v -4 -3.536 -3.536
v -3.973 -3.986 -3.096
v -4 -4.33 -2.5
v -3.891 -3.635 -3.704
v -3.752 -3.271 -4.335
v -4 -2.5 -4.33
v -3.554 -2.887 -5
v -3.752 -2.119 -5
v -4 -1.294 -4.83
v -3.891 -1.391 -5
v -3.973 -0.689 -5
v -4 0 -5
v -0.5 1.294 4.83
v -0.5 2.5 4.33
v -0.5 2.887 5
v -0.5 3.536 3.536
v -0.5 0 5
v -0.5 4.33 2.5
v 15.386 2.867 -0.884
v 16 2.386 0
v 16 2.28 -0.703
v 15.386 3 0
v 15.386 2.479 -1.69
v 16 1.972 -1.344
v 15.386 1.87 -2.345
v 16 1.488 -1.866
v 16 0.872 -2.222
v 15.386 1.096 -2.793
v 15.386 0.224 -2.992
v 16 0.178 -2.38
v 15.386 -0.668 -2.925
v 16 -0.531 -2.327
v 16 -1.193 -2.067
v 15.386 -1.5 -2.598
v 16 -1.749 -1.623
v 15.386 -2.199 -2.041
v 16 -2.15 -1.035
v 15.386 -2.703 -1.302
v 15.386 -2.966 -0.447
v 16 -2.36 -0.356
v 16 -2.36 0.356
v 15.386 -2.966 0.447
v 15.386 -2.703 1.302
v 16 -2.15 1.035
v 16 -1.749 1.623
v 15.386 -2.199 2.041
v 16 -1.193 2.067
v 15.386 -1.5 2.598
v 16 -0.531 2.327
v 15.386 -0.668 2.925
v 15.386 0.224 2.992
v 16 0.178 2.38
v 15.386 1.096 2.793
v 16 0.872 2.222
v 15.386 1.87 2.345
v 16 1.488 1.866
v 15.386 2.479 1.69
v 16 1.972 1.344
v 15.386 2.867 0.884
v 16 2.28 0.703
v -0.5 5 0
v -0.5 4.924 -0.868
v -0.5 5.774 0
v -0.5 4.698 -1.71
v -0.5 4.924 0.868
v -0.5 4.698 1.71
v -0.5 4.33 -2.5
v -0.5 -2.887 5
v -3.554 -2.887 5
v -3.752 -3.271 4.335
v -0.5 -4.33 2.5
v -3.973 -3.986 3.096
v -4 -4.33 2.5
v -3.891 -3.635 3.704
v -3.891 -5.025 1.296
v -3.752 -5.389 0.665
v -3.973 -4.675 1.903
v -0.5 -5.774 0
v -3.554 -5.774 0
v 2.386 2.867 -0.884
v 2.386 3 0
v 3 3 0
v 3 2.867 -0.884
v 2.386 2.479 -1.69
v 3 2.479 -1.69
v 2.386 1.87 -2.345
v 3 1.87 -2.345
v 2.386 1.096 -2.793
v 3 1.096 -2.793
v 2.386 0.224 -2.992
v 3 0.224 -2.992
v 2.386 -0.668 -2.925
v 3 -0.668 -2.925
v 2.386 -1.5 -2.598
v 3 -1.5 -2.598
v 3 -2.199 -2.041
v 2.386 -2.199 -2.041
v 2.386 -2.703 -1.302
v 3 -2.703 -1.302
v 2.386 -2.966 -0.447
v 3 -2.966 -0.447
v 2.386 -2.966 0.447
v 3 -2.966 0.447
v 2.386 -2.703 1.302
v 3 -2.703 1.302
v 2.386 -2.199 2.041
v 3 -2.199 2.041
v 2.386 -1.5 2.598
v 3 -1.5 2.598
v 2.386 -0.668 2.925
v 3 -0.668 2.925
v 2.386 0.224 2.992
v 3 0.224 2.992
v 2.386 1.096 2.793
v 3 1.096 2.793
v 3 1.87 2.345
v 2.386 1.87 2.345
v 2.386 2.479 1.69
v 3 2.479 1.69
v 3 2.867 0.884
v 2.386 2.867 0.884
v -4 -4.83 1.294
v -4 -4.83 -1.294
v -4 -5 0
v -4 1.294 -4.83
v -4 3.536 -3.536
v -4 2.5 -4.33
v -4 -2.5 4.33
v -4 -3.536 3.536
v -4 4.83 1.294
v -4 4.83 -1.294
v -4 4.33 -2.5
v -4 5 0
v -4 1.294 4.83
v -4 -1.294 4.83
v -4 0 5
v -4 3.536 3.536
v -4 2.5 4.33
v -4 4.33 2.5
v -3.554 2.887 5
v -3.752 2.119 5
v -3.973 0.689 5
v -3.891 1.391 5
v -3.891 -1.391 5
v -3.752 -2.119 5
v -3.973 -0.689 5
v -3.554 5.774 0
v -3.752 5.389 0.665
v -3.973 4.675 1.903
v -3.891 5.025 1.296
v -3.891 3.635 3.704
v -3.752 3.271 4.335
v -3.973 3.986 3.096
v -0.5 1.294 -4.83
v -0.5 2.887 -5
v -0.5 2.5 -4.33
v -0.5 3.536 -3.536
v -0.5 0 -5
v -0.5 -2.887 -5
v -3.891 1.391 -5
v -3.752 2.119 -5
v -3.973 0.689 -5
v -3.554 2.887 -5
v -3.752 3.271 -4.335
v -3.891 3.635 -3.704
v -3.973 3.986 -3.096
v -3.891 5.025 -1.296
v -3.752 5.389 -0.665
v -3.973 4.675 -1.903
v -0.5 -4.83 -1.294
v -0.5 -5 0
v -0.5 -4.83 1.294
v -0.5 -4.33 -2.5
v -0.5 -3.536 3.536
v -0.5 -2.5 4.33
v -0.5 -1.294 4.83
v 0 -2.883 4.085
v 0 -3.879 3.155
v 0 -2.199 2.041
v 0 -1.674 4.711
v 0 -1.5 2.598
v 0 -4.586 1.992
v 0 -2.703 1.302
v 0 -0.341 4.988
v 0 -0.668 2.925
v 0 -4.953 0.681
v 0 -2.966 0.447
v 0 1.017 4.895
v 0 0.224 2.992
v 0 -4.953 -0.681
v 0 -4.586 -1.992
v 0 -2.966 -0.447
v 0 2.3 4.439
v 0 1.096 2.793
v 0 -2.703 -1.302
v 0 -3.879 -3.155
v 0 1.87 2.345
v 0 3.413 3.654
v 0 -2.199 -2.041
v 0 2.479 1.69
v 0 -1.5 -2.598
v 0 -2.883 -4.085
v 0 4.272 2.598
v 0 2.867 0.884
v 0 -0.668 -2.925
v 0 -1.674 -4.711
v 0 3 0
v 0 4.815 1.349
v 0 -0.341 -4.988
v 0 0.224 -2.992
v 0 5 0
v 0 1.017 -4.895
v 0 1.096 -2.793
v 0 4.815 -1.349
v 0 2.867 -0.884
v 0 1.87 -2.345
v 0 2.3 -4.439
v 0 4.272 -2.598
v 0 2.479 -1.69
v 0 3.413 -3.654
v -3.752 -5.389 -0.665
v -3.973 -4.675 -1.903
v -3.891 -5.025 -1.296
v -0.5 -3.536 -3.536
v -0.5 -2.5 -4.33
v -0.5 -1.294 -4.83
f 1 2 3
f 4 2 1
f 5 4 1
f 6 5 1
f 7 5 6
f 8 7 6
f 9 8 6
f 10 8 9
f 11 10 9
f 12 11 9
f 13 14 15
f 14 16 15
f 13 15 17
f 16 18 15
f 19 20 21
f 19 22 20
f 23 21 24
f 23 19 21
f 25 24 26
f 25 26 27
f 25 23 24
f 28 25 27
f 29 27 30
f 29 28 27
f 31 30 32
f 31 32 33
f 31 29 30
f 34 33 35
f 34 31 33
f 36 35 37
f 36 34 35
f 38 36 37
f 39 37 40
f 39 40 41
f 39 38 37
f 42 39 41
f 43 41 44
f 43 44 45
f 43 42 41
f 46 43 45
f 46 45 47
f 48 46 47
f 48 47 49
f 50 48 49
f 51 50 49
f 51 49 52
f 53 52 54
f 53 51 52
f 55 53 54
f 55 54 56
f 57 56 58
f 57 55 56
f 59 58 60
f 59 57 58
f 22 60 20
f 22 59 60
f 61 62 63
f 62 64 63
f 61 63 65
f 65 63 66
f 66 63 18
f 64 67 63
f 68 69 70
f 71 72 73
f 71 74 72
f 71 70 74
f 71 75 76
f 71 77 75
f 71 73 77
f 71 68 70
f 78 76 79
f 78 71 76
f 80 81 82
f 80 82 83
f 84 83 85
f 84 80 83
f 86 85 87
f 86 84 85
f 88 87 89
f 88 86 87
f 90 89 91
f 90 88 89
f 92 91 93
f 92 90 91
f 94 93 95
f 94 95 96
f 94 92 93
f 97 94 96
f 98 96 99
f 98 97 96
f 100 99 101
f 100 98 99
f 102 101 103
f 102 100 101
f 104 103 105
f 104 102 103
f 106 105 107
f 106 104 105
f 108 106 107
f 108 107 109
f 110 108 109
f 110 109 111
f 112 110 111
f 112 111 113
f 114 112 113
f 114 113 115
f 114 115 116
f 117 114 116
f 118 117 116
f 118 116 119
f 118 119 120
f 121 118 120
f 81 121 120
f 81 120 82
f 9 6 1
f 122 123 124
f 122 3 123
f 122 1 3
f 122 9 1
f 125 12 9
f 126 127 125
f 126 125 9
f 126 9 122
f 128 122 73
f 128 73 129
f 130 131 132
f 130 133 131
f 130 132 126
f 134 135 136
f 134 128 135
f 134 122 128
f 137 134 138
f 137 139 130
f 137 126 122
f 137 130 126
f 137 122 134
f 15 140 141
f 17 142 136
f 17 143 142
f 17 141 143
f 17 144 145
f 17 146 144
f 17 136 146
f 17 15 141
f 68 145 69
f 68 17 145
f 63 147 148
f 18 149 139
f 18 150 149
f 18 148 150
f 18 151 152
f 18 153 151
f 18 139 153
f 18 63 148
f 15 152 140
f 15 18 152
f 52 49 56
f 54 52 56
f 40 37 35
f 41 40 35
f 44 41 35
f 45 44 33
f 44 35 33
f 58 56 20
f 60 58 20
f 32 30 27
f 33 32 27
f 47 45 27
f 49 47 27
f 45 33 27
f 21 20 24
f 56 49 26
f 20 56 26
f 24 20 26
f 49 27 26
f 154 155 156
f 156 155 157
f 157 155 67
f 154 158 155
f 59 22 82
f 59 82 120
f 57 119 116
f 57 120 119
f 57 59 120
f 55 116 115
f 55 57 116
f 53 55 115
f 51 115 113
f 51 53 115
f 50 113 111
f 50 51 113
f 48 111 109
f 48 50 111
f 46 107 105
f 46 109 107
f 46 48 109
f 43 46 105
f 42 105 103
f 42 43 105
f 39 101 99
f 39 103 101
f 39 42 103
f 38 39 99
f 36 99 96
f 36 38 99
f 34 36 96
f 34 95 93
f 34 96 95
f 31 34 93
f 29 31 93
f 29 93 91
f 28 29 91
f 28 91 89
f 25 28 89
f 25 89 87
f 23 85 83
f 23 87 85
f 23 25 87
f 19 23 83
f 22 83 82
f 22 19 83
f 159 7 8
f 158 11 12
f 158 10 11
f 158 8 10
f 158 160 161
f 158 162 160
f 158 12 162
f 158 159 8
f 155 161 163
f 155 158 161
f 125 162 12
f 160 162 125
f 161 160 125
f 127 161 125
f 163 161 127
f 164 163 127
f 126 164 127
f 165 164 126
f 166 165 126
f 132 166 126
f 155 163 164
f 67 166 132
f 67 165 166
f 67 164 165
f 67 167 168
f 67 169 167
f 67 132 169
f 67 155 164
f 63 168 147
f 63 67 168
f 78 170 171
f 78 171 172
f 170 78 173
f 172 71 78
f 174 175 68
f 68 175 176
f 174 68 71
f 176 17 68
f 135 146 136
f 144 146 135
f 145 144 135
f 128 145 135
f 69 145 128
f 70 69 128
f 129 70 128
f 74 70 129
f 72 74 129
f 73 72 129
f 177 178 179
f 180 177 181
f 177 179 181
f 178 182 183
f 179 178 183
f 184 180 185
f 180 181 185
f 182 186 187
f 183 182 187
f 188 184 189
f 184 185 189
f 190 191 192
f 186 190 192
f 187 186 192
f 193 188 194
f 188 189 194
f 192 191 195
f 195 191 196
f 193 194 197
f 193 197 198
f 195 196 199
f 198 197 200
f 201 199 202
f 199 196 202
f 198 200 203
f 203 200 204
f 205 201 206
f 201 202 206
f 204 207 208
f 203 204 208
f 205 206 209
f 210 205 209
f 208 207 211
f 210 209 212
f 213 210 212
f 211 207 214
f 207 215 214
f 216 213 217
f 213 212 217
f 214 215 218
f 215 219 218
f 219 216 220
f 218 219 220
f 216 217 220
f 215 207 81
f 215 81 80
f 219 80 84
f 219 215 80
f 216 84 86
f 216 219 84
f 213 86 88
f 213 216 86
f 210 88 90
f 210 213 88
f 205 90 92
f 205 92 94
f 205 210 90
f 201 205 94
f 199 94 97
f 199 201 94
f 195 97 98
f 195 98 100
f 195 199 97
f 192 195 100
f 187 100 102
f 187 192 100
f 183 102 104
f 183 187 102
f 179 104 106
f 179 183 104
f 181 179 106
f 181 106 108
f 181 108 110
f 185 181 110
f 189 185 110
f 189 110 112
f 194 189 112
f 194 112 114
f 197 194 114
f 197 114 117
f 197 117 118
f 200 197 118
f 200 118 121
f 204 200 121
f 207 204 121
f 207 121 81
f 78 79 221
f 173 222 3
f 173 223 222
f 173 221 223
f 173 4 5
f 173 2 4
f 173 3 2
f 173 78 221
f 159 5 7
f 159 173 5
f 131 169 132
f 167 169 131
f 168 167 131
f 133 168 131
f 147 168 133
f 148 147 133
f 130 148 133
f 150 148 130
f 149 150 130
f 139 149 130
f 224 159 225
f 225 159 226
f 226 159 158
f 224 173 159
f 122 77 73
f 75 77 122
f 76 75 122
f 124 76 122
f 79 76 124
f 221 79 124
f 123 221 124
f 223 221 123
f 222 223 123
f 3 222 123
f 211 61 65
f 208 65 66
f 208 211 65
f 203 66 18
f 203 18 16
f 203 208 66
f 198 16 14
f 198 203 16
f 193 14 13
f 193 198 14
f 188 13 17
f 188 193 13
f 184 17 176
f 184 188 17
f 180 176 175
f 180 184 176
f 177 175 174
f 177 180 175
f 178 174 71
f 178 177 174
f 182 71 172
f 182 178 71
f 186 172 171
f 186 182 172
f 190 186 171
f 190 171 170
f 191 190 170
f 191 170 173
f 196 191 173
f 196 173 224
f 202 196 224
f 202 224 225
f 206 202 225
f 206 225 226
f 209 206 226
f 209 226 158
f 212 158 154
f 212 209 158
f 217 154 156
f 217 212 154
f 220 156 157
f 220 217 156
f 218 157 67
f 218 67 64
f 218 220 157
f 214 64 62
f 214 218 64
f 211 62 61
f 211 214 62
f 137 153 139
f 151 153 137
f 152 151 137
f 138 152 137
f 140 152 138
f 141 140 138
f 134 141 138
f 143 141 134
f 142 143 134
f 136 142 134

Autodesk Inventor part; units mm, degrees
ref_plane "YZ Plane" through (0, 0, 0) normal (1, 0, 0) x (0, 1, 0)
ref_plane "XZ Plane" through (0, 0, 0) normal (0, 1, 0) x (-1, 0, 0)
sketch "Sketch1" plane through (0, 0, 0) normal (0, 0, 1) x (1, 0, 0)
  line L0 (0, 5) -> (0, 3)
  line L1 (3, 3) -> (16, 3)
  line L2 (16, 3) -> (16, 0)
  line L3 (16, 0) -> (-0.5001, 0)
  line L4 (-3.8001, 0) -> (19.3, 0) projected
  line L5 (-0.5001, 0) -> (-0.5001, 5)
  line L6 (-0.5001, 5) -> (0, 5)
  line L7 (3, 3) -> (2.3865, 3)
  line L8 (2.3865, 3) -> (0, 3)
  line L9 (0, -1) -> (0, 6) projected
  dimension "d0" = 16
  dimension "d1" = 13
  dimension "d2" = 6
  dimension "d9" = 0.5001
  dimension "d10" = 10
  dimension "d13" = 0.6136
  dimension "d14" = 6
revolve "Body" add sketch "Sketch1" angle 360 about axis through (16, 0, 0) along (-1, 0, 0)
sketch "Sketch2" plane through (-0.5001, 0, 0) normal (-1, 0, 0) x (0, 0, 1)
  line L0 (0, 5.7735) -> (5, 2.8868)
  line L1 (5, 2.8868) -> (5, -2.8868)
  line L2 (5, -2.8868) -> (0, -5.7735)
  line L3 (0, -5.7735) -> (-5, -2.8868)
  line L4 (-5, -2.8868) -> (-5, 2.8868)
  line L5 (-5, 2.8868) -> (0, 5.7735)
  point P0 (0, 0)
  point P1 (0, 0)
  dimension "d11" = 10
extrude "Head" add sketch "Sketch2" along normal blind 3.5
sketch "Sketch4" plane through (0, 0, 0) normal (0, 0, 1) x (1, 0, 0)
  line L0 (-4.0001, 5) -> (-4.0001, 5.7735)
  line L1 (-4.0001, 5.7735) -> (-3.5535, 5.7735)
  line L2 (-3.5535, 5.7735) -> (-4.0001, 5)
  line L3 (-4.7001, 0) -> (0.1999, 0) projected
  line L4 (-0.5001, 5.7735) -> (-4.0001, 5.7735) projected
  line L5 (-4.0001, 2.8868) -> (-4.0001, 5.7735) projected
  dimension "d5" = 30
  dimension "d19" = 10
revolve "Chamfer1" cut sketch "Sketch4" angle 360 about axis through (-10, 0, 0) along (1, 0, 0)
thread "Thread" size "M6x1" class "6g" standard "ISO Metric profile" length 13
chamfer "Chamfer2" distance 0.6135 distance2 0.6136 1 edges at (16, -3, 0) measured on face at (16, -0.301, 1.1526)
ref_plane "Work Plane1" through (1.525, 0, 0) normal (0, 0, 1) x (1, 0, 0)
equation "\"d0\" = NLG"
equation "\"d1\" = GEL"
equation "\"d2\" = GD"
equation "\"d10\" = SD2"
equation "\"d14\" = BDM"
equation "\"d11\" = SW"
equation "\"d3\" = KOH - SD"
equation "\"d5\" = ANG1"
equation "\"d19\" = SW0"
equation "\"d15\" = GEL"
equation "\"d6\" = -0.5 * SPD + 0.5 * GD"
equation "\"NLG\" = 16"
equation "\"GD\" = NND"
equation "\"BDM\" = NND"
equation "\"KOH\" = 4"
equation "\"GEL\" = 13"
equation "\"SW\" = 10"
equation "\"SW0\" = SW"
equation "\"SPD\" = NND - 1.2269 * PTC"
equation "\"SD2\" = SW"
equation "\"SD\" = 0.5"
equation "\"ANG1\" = 30deg"
equation "\"GAL\" = 0.61345 * PTC"
equation "\"GUL\" = 0.61345 * PTC"
equation "\"RR\" = 0.25"
equation "\"WFT\" = SD"
equation "\"GD1\" = THREADDIA - 1.2269 * PTC"
equation "\"THREADDIA\" = 6"
equation "\"TOA\" = 30deg"
equation "\"FAWI\" = 45deg"
equation "\"PTC\" = 1"
equation "\"NND\" = 6"
equation "\"E0\" = 1.155 * SW"
properties part number "AS 1110 - M6 x 16" material "Steel, Mild"
